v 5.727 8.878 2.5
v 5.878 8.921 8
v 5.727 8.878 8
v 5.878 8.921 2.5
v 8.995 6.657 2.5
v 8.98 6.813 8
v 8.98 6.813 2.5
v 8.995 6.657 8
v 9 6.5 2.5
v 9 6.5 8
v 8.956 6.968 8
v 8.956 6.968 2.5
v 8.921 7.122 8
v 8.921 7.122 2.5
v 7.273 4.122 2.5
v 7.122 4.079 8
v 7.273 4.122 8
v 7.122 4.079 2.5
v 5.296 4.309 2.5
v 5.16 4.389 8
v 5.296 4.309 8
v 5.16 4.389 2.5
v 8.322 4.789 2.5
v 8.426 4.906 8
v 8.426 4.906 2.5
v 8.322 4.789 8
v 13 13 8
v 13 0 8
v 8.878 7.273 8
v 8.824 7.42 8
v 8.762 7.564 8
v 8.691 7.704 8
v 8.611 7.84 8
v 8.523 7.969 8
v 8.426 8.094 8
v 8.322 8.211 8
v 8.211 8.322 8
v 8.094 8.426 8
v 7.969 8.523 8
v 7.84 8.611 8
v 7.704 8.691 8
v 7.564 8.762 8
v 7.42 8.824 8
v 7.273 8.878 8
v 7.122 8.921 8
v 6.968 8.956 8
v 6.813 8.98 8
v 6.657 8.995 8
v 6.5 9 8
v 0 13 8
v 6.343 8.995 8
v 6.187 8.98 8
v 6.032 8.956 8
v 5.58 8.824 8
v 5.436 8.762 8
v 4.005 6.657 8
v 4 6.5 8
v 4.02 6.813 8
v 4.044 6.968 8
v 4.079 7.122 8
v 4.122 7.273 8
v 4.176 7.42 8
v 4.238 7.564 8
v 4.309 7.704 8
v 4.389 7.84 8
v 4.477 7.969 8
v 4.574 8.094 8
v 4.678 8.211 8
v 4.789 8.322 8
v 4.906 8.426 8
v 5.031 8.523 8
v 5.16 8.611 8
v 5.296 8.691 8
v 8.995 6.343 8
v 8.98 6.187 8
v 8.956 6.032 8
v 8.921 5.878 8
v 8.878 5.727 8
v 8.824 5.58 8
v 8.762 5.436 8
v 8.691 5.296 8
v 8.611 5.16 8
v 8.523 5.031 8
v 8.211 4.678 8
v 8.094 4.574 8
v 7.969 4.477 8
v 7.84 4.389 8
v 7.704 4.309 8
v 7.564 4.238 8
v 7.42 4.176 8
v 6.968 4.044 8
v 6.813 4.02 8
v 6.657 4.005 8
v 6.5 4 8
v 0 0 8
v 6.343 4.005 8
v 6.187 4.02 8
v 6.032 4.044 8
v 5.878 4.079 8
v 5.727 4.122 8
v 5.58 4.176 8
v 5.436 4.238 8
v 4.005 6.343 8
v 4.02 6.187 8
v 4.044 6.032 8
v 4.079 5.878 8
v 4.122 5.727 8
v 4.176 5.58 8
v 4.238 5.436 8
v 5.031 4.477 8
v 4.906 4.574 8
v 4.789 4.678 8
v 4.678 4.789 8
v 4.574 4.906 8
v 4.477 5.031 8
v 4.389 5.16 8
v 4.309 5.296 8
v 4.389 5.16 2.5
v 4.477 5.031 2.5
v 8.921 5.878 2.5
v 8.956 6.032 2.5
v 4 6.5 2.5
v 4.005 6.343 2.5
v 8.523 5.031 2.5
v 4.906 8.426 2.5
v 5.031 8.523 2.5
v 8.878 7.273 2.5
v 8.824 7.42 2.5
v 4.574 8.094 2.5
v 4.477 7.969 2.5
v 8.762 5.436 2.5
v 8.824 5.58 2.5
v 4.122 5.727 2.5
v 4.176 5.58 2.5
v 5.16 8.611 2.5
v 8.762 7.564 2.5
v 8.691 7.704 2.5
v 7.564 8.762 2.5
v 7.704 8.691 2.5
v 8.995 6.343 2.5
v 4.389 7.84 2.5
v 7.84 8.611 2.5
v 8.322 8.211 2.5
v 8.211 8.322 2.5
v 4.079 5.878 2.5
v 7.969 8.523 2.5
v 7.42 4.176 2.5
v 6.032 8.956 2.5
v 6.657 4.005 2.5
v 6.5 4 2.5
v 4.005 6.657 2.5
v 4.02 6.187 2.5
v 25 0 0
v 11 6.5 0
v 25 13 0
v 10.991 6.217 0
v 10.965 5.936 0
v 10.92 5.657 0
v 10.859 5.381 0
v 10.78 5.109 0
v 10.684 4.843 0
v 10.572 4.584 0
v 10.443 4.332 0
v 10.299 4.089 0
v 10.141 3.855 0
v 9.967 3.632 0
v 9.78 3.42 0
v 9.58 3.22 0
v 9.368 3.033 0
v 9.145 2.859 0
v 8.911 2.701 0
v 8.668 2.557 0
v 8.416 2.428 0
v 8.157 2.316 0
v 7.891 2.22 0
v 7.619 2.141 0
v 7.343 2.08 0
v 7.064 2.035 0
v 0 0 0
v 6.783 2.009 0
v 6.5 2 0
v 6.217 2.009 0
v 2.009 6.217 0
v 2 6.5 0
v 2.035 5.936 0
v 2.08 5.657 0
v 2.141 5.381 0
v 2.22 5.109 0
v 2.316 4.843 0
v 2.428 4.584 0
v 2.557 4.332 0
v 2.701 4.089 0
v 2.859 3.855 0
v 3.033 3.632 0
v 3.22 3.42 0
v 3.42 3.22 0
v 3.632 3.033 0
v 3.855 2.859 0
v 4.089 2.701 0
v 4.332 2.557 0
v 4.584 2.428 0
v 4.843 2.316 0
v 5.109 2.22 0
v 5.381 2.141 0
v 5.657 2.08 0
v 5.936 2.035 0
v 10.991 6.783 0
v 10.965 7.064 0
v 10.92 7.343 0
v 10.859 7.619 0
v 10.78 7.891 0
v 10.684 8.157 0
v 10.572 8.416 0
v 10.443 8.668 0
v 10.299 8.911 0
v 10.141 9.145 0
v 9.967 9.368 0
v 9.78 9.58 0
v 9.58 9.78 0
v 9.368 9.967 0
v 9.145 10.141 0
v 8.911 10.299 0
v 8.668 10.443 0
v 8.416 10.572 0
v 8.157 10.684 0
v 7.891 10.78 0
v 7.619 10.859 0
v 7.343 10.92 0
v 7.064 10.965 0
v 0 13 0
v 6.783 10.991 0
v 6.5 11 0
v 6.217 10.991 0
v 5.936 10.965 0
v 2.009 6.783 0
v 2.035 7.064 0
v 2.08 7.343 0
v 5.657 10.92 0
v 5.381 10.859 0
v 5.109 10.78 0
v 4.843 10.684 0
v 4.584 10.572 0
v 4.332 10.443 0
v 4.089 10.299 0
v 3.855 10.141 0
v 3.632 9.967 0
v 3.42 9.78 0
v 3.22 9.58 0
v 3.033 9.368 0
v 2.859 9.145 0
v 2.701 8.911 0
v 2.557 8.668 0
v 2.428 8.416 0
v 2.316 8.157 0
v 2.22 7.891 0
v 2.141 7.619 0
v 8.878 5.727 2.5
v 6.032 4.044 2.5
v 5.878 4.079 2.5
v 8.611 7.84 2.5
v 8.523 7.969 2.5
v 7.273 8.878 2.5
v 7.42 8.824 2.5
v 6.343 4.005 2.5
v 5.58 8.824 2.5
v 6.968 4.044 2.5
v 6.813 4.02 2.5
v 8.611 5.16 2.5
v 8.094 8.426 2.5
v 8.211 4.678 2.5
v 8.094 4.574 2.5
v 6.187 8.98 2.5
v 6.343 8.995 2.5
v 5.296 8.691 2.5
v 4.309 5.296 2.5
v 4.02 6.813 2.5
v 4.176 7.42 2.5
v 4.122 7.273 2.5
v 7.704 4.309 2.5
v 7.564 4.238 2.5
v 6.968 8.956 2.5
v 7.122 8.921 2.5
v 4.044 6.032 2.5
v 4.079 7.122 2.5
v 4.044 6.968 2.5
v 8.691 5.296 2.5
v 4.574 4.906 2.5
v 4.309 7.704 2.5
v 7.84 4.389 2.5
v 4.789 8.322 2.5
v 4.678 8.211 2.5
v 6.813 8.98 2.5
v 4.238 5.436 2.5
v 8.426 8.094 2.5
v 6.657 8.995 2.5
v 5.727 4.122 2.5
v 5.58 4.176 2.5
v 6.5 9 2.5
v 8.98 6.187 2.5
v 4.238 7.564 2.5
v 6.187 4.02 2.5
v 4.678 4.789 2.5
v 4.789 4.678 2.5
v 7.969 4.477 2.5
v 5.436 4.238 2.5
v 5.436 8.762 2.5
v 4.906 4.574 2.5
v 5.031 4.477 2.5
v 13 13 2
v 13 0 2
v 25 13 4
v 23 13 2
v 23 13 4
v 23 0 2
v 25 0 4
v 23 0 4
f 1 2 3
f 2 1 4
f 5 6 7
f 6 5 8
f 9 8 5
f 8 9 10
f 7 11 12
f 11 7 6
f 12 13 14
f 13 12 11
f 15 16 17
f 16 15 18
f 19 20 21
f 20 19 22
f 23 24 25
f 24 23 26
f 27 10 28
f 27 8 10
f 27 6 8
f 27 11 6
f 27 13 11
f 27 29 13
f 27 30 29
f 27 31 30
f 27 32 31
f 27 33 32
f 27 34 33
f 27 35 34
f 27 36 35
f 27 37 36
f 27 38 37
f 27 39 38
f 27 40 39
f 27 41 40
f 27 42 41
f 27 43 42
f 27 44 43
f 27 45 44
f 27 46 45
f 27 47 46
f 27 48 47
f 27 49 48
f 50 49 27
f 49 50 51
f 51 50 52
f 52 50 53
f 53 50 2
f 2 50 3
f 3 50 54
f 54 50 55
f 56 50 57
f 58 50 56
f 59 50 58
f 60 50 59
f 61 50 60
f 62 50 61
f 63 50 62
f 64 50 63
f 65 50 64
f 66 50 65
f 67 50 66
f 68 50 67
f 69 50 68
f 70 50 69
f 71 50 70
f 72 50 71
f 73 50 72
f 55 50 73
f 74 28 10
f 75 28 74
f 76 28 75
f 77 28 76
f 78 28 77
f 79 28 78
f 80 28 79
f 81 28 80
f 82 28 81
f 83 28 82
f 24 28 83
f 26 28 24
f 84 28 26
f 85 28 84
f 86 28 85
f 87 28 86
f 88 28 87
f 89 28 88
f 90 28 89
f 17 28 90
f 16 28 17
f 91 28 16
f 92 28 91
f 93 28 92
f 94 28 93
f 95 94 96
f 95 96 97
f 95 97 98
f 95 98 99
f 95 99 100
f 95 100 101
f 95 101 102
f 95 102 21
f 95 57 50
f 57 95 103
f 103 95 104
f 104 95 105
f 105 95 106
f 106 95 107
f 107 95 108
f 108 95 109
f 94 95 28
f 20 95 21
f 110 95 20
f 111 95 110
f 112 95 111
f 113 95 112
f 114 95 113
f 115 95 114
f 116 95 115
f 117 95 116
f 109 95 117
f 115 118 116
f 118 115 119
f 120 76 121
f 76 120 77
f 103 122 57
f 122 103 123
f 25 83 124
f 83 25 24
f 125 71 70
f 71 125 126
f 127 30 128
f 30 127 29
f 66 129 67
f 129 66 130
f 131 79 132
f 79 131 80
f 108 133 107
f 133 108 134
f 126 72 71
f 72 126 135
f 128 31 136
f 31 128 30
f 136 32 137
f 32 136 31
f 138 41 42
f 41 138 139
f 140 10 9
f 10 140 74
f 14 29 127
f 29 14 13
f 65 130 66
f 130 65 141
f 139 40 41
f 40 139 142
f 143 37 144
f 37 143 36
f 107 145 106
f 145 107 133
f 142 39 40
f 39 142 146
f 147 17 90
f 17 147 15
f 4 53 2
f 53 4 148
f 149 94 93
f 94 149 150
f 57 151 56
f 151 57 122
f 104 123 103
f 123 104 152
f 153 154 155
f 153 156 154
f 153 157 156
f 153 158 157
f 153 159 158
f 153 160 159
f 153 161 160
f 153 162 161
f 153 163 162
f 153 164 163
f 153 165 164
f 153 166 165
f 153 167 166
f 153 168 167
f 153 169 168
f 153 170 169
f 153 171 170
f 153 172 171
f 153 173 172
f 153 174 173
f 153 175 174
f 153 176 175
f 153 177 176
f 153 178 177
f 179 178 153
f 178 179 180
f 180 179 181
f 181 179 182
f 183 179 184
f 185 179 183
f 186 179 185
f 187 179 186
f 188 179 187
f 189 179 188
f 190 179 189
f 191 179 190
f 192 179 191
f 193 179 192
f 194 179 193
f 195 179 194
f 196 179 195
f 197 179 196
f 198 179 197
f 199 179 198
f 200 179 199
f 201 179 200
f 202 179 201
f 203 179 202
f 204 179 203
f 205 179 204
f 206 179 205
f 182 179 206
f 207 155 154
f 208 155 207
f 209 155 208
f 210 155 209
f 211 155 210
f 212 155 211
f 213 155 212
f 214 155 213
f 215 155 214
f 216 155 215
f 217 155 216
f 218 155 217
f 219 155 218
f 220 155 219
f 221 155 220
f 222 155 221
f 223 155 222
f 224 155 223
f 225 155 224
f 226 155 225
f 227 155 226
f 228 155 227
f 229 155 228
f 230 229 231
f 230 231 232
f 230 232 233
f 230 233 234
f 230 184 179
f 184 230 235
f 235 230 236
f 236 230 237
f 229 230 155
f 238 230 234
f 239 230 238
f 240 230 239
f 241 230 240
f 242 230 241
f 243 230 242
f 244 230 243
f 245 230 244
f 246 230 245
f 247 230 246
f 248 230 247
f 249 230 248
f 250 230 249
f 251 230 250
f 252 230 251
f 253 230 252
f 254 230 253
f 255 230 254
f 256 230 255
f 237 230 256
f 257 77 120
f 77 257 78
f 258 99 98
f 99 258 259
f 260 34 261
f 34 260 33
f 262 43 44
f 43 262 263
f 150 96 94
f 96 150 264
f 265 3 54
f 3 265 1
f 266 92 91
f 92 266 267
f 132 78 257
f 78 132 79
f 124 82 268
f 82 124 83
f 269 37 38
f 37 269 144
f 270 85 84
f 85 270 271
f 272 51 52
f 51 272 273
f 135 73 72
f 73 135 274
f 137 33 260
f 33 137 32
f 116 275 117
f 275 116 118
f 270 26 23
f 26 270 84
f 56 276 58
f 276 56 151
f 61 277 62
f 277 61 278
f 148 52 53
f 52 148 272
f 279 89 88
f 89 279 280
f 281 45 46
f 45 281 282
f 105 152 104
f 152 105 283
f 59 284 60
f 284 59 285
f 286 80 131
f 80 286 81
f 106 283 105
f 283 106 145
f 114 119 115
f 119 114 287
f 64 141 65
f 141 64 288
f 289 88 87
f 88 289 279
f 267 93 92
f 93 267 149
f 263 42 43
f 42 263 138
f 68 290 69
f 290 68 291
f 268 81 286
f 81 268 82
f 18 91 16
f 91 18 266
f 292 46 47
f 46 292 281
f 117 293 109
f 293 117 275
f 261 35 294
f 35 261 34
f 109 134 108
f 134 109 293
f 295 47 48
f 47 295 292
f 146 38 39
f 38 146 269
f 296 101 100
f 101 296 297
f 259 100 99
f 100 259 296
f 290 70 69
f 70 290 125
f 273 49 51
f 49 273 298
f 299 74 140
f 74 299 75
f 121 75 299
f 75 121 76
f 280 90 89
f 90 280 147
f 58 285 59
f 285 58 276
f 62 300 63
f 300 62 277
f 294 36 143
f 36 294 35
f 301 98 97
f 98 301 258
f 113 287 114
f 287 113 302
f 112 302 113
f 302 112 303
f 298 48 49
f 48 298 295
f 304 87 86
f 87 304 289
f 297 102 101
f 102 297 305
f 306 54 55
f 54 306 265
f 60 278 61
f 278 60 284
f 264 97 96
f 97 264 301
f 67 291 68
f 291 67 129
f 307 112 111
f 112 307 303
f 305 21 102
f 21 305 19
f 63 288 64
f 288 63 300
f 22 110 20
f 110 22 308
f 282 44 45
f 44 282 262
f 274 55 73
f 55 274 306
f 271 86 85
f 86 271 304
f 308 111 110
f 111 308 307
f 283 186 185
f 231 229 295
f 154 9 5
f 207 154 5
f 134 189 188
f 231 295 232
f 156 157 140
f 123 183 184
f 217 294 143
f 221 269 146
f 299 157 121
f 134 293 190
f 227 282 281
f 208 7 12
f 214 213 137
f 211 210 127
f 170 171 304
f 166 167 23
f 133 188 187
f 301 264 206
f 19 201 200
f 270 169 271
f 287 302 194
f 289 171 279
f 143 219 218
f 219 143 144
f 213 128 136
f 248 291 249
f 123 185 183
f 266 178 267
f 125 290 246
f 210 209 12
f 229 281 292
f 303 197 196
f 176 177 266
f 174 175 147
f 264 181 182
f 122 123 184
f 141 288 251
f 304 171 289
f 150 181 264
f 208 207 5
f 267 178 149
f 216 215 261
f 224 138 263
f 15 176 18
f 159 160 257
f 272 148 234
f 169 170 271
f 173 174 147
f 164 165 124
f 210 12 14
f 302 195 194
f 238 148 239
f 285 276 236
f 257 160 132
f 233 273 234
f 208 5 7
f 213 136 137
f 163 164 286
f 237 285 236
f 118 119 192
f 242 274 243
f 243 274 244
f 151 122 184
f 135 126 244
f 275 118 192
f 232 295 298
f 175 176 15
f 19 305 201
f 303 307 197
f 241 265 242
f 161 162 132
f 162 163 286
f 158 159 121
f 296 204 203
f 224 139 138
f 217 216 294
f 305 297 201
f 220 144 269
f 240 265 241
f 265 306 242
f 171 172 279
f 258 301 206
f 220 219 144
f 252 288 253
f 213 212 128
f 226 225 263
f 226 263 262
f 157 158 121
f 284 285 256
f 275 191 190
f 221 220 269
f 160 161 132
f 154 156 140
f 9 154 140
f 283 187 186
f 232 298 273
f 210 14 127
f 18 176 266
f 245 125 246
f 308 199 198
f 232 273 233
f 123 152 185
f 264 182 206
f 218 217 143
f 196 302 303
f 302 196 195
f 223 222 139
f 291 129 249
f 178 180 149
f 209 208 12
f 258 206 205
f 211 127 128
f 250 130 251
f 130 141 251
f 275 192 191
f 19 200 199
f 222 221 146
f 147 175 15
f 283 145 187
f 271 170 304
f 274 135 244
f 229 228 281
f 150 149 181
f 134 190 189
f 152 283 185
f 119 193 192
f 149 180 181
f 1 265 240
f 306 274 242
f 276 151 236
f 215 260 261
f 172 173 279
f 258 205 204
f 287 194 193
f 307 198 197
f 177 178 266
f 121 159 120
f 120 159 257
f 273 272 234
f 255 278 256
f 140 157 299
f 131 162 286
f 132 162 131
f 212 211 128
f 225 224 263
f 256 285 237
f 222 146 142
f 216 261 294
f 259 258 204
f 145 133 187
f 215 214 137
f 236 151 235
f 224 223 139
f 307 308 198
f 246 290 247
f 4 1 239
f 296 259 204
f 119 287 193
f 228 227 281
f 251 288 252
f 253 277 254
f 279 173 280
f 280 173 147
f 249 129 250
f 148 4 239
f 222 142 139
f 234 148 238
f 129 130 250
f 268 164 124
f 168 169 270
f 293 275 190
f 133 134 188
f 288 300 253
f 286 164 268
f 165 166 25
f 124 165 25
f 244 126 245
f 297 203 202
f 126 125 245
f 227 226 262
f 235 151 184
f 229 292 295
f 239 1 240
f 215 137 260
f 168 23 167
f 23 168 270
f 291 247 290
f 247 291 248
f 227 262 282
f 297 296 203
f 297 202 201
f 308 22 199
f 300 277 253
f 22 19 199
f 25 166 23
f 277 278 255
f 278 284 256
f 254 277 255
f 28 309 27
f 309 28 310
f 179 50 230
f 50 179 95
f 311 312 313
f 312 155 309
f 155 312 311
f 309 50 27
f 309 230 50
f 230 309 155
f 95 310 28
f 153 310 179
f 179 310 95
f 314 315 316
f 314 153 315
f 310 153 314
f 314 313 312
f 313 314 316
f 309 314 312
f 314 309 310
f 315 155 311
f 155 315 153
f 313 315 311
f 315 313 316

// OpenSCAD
cable_width = 10;

screw_length = 16;
screw_diameter = 5;
screw_head_diameter = 9;
screw_head_height = 2.5;

hole_depth = 8;

$fn = 100;
t = 2;

w = screw_head_diameter + t * 2;
h = screw_length - hole_depth;

difference() {
  cube([w, w, h]);
  translate([w * 0.5, w * 0.5, 0]) {
    cylinder(h = h, d = screw_diameter);
    cylinder(h = screw_head_height, d1 = screw_head_diameter, d2 = screw_diameter);
  }
}

translate([w, 0, 0]) cube([cable_width, w, t]);
translate([w + cable_width, 0, 0]) cube([t, w, t * 2]);
